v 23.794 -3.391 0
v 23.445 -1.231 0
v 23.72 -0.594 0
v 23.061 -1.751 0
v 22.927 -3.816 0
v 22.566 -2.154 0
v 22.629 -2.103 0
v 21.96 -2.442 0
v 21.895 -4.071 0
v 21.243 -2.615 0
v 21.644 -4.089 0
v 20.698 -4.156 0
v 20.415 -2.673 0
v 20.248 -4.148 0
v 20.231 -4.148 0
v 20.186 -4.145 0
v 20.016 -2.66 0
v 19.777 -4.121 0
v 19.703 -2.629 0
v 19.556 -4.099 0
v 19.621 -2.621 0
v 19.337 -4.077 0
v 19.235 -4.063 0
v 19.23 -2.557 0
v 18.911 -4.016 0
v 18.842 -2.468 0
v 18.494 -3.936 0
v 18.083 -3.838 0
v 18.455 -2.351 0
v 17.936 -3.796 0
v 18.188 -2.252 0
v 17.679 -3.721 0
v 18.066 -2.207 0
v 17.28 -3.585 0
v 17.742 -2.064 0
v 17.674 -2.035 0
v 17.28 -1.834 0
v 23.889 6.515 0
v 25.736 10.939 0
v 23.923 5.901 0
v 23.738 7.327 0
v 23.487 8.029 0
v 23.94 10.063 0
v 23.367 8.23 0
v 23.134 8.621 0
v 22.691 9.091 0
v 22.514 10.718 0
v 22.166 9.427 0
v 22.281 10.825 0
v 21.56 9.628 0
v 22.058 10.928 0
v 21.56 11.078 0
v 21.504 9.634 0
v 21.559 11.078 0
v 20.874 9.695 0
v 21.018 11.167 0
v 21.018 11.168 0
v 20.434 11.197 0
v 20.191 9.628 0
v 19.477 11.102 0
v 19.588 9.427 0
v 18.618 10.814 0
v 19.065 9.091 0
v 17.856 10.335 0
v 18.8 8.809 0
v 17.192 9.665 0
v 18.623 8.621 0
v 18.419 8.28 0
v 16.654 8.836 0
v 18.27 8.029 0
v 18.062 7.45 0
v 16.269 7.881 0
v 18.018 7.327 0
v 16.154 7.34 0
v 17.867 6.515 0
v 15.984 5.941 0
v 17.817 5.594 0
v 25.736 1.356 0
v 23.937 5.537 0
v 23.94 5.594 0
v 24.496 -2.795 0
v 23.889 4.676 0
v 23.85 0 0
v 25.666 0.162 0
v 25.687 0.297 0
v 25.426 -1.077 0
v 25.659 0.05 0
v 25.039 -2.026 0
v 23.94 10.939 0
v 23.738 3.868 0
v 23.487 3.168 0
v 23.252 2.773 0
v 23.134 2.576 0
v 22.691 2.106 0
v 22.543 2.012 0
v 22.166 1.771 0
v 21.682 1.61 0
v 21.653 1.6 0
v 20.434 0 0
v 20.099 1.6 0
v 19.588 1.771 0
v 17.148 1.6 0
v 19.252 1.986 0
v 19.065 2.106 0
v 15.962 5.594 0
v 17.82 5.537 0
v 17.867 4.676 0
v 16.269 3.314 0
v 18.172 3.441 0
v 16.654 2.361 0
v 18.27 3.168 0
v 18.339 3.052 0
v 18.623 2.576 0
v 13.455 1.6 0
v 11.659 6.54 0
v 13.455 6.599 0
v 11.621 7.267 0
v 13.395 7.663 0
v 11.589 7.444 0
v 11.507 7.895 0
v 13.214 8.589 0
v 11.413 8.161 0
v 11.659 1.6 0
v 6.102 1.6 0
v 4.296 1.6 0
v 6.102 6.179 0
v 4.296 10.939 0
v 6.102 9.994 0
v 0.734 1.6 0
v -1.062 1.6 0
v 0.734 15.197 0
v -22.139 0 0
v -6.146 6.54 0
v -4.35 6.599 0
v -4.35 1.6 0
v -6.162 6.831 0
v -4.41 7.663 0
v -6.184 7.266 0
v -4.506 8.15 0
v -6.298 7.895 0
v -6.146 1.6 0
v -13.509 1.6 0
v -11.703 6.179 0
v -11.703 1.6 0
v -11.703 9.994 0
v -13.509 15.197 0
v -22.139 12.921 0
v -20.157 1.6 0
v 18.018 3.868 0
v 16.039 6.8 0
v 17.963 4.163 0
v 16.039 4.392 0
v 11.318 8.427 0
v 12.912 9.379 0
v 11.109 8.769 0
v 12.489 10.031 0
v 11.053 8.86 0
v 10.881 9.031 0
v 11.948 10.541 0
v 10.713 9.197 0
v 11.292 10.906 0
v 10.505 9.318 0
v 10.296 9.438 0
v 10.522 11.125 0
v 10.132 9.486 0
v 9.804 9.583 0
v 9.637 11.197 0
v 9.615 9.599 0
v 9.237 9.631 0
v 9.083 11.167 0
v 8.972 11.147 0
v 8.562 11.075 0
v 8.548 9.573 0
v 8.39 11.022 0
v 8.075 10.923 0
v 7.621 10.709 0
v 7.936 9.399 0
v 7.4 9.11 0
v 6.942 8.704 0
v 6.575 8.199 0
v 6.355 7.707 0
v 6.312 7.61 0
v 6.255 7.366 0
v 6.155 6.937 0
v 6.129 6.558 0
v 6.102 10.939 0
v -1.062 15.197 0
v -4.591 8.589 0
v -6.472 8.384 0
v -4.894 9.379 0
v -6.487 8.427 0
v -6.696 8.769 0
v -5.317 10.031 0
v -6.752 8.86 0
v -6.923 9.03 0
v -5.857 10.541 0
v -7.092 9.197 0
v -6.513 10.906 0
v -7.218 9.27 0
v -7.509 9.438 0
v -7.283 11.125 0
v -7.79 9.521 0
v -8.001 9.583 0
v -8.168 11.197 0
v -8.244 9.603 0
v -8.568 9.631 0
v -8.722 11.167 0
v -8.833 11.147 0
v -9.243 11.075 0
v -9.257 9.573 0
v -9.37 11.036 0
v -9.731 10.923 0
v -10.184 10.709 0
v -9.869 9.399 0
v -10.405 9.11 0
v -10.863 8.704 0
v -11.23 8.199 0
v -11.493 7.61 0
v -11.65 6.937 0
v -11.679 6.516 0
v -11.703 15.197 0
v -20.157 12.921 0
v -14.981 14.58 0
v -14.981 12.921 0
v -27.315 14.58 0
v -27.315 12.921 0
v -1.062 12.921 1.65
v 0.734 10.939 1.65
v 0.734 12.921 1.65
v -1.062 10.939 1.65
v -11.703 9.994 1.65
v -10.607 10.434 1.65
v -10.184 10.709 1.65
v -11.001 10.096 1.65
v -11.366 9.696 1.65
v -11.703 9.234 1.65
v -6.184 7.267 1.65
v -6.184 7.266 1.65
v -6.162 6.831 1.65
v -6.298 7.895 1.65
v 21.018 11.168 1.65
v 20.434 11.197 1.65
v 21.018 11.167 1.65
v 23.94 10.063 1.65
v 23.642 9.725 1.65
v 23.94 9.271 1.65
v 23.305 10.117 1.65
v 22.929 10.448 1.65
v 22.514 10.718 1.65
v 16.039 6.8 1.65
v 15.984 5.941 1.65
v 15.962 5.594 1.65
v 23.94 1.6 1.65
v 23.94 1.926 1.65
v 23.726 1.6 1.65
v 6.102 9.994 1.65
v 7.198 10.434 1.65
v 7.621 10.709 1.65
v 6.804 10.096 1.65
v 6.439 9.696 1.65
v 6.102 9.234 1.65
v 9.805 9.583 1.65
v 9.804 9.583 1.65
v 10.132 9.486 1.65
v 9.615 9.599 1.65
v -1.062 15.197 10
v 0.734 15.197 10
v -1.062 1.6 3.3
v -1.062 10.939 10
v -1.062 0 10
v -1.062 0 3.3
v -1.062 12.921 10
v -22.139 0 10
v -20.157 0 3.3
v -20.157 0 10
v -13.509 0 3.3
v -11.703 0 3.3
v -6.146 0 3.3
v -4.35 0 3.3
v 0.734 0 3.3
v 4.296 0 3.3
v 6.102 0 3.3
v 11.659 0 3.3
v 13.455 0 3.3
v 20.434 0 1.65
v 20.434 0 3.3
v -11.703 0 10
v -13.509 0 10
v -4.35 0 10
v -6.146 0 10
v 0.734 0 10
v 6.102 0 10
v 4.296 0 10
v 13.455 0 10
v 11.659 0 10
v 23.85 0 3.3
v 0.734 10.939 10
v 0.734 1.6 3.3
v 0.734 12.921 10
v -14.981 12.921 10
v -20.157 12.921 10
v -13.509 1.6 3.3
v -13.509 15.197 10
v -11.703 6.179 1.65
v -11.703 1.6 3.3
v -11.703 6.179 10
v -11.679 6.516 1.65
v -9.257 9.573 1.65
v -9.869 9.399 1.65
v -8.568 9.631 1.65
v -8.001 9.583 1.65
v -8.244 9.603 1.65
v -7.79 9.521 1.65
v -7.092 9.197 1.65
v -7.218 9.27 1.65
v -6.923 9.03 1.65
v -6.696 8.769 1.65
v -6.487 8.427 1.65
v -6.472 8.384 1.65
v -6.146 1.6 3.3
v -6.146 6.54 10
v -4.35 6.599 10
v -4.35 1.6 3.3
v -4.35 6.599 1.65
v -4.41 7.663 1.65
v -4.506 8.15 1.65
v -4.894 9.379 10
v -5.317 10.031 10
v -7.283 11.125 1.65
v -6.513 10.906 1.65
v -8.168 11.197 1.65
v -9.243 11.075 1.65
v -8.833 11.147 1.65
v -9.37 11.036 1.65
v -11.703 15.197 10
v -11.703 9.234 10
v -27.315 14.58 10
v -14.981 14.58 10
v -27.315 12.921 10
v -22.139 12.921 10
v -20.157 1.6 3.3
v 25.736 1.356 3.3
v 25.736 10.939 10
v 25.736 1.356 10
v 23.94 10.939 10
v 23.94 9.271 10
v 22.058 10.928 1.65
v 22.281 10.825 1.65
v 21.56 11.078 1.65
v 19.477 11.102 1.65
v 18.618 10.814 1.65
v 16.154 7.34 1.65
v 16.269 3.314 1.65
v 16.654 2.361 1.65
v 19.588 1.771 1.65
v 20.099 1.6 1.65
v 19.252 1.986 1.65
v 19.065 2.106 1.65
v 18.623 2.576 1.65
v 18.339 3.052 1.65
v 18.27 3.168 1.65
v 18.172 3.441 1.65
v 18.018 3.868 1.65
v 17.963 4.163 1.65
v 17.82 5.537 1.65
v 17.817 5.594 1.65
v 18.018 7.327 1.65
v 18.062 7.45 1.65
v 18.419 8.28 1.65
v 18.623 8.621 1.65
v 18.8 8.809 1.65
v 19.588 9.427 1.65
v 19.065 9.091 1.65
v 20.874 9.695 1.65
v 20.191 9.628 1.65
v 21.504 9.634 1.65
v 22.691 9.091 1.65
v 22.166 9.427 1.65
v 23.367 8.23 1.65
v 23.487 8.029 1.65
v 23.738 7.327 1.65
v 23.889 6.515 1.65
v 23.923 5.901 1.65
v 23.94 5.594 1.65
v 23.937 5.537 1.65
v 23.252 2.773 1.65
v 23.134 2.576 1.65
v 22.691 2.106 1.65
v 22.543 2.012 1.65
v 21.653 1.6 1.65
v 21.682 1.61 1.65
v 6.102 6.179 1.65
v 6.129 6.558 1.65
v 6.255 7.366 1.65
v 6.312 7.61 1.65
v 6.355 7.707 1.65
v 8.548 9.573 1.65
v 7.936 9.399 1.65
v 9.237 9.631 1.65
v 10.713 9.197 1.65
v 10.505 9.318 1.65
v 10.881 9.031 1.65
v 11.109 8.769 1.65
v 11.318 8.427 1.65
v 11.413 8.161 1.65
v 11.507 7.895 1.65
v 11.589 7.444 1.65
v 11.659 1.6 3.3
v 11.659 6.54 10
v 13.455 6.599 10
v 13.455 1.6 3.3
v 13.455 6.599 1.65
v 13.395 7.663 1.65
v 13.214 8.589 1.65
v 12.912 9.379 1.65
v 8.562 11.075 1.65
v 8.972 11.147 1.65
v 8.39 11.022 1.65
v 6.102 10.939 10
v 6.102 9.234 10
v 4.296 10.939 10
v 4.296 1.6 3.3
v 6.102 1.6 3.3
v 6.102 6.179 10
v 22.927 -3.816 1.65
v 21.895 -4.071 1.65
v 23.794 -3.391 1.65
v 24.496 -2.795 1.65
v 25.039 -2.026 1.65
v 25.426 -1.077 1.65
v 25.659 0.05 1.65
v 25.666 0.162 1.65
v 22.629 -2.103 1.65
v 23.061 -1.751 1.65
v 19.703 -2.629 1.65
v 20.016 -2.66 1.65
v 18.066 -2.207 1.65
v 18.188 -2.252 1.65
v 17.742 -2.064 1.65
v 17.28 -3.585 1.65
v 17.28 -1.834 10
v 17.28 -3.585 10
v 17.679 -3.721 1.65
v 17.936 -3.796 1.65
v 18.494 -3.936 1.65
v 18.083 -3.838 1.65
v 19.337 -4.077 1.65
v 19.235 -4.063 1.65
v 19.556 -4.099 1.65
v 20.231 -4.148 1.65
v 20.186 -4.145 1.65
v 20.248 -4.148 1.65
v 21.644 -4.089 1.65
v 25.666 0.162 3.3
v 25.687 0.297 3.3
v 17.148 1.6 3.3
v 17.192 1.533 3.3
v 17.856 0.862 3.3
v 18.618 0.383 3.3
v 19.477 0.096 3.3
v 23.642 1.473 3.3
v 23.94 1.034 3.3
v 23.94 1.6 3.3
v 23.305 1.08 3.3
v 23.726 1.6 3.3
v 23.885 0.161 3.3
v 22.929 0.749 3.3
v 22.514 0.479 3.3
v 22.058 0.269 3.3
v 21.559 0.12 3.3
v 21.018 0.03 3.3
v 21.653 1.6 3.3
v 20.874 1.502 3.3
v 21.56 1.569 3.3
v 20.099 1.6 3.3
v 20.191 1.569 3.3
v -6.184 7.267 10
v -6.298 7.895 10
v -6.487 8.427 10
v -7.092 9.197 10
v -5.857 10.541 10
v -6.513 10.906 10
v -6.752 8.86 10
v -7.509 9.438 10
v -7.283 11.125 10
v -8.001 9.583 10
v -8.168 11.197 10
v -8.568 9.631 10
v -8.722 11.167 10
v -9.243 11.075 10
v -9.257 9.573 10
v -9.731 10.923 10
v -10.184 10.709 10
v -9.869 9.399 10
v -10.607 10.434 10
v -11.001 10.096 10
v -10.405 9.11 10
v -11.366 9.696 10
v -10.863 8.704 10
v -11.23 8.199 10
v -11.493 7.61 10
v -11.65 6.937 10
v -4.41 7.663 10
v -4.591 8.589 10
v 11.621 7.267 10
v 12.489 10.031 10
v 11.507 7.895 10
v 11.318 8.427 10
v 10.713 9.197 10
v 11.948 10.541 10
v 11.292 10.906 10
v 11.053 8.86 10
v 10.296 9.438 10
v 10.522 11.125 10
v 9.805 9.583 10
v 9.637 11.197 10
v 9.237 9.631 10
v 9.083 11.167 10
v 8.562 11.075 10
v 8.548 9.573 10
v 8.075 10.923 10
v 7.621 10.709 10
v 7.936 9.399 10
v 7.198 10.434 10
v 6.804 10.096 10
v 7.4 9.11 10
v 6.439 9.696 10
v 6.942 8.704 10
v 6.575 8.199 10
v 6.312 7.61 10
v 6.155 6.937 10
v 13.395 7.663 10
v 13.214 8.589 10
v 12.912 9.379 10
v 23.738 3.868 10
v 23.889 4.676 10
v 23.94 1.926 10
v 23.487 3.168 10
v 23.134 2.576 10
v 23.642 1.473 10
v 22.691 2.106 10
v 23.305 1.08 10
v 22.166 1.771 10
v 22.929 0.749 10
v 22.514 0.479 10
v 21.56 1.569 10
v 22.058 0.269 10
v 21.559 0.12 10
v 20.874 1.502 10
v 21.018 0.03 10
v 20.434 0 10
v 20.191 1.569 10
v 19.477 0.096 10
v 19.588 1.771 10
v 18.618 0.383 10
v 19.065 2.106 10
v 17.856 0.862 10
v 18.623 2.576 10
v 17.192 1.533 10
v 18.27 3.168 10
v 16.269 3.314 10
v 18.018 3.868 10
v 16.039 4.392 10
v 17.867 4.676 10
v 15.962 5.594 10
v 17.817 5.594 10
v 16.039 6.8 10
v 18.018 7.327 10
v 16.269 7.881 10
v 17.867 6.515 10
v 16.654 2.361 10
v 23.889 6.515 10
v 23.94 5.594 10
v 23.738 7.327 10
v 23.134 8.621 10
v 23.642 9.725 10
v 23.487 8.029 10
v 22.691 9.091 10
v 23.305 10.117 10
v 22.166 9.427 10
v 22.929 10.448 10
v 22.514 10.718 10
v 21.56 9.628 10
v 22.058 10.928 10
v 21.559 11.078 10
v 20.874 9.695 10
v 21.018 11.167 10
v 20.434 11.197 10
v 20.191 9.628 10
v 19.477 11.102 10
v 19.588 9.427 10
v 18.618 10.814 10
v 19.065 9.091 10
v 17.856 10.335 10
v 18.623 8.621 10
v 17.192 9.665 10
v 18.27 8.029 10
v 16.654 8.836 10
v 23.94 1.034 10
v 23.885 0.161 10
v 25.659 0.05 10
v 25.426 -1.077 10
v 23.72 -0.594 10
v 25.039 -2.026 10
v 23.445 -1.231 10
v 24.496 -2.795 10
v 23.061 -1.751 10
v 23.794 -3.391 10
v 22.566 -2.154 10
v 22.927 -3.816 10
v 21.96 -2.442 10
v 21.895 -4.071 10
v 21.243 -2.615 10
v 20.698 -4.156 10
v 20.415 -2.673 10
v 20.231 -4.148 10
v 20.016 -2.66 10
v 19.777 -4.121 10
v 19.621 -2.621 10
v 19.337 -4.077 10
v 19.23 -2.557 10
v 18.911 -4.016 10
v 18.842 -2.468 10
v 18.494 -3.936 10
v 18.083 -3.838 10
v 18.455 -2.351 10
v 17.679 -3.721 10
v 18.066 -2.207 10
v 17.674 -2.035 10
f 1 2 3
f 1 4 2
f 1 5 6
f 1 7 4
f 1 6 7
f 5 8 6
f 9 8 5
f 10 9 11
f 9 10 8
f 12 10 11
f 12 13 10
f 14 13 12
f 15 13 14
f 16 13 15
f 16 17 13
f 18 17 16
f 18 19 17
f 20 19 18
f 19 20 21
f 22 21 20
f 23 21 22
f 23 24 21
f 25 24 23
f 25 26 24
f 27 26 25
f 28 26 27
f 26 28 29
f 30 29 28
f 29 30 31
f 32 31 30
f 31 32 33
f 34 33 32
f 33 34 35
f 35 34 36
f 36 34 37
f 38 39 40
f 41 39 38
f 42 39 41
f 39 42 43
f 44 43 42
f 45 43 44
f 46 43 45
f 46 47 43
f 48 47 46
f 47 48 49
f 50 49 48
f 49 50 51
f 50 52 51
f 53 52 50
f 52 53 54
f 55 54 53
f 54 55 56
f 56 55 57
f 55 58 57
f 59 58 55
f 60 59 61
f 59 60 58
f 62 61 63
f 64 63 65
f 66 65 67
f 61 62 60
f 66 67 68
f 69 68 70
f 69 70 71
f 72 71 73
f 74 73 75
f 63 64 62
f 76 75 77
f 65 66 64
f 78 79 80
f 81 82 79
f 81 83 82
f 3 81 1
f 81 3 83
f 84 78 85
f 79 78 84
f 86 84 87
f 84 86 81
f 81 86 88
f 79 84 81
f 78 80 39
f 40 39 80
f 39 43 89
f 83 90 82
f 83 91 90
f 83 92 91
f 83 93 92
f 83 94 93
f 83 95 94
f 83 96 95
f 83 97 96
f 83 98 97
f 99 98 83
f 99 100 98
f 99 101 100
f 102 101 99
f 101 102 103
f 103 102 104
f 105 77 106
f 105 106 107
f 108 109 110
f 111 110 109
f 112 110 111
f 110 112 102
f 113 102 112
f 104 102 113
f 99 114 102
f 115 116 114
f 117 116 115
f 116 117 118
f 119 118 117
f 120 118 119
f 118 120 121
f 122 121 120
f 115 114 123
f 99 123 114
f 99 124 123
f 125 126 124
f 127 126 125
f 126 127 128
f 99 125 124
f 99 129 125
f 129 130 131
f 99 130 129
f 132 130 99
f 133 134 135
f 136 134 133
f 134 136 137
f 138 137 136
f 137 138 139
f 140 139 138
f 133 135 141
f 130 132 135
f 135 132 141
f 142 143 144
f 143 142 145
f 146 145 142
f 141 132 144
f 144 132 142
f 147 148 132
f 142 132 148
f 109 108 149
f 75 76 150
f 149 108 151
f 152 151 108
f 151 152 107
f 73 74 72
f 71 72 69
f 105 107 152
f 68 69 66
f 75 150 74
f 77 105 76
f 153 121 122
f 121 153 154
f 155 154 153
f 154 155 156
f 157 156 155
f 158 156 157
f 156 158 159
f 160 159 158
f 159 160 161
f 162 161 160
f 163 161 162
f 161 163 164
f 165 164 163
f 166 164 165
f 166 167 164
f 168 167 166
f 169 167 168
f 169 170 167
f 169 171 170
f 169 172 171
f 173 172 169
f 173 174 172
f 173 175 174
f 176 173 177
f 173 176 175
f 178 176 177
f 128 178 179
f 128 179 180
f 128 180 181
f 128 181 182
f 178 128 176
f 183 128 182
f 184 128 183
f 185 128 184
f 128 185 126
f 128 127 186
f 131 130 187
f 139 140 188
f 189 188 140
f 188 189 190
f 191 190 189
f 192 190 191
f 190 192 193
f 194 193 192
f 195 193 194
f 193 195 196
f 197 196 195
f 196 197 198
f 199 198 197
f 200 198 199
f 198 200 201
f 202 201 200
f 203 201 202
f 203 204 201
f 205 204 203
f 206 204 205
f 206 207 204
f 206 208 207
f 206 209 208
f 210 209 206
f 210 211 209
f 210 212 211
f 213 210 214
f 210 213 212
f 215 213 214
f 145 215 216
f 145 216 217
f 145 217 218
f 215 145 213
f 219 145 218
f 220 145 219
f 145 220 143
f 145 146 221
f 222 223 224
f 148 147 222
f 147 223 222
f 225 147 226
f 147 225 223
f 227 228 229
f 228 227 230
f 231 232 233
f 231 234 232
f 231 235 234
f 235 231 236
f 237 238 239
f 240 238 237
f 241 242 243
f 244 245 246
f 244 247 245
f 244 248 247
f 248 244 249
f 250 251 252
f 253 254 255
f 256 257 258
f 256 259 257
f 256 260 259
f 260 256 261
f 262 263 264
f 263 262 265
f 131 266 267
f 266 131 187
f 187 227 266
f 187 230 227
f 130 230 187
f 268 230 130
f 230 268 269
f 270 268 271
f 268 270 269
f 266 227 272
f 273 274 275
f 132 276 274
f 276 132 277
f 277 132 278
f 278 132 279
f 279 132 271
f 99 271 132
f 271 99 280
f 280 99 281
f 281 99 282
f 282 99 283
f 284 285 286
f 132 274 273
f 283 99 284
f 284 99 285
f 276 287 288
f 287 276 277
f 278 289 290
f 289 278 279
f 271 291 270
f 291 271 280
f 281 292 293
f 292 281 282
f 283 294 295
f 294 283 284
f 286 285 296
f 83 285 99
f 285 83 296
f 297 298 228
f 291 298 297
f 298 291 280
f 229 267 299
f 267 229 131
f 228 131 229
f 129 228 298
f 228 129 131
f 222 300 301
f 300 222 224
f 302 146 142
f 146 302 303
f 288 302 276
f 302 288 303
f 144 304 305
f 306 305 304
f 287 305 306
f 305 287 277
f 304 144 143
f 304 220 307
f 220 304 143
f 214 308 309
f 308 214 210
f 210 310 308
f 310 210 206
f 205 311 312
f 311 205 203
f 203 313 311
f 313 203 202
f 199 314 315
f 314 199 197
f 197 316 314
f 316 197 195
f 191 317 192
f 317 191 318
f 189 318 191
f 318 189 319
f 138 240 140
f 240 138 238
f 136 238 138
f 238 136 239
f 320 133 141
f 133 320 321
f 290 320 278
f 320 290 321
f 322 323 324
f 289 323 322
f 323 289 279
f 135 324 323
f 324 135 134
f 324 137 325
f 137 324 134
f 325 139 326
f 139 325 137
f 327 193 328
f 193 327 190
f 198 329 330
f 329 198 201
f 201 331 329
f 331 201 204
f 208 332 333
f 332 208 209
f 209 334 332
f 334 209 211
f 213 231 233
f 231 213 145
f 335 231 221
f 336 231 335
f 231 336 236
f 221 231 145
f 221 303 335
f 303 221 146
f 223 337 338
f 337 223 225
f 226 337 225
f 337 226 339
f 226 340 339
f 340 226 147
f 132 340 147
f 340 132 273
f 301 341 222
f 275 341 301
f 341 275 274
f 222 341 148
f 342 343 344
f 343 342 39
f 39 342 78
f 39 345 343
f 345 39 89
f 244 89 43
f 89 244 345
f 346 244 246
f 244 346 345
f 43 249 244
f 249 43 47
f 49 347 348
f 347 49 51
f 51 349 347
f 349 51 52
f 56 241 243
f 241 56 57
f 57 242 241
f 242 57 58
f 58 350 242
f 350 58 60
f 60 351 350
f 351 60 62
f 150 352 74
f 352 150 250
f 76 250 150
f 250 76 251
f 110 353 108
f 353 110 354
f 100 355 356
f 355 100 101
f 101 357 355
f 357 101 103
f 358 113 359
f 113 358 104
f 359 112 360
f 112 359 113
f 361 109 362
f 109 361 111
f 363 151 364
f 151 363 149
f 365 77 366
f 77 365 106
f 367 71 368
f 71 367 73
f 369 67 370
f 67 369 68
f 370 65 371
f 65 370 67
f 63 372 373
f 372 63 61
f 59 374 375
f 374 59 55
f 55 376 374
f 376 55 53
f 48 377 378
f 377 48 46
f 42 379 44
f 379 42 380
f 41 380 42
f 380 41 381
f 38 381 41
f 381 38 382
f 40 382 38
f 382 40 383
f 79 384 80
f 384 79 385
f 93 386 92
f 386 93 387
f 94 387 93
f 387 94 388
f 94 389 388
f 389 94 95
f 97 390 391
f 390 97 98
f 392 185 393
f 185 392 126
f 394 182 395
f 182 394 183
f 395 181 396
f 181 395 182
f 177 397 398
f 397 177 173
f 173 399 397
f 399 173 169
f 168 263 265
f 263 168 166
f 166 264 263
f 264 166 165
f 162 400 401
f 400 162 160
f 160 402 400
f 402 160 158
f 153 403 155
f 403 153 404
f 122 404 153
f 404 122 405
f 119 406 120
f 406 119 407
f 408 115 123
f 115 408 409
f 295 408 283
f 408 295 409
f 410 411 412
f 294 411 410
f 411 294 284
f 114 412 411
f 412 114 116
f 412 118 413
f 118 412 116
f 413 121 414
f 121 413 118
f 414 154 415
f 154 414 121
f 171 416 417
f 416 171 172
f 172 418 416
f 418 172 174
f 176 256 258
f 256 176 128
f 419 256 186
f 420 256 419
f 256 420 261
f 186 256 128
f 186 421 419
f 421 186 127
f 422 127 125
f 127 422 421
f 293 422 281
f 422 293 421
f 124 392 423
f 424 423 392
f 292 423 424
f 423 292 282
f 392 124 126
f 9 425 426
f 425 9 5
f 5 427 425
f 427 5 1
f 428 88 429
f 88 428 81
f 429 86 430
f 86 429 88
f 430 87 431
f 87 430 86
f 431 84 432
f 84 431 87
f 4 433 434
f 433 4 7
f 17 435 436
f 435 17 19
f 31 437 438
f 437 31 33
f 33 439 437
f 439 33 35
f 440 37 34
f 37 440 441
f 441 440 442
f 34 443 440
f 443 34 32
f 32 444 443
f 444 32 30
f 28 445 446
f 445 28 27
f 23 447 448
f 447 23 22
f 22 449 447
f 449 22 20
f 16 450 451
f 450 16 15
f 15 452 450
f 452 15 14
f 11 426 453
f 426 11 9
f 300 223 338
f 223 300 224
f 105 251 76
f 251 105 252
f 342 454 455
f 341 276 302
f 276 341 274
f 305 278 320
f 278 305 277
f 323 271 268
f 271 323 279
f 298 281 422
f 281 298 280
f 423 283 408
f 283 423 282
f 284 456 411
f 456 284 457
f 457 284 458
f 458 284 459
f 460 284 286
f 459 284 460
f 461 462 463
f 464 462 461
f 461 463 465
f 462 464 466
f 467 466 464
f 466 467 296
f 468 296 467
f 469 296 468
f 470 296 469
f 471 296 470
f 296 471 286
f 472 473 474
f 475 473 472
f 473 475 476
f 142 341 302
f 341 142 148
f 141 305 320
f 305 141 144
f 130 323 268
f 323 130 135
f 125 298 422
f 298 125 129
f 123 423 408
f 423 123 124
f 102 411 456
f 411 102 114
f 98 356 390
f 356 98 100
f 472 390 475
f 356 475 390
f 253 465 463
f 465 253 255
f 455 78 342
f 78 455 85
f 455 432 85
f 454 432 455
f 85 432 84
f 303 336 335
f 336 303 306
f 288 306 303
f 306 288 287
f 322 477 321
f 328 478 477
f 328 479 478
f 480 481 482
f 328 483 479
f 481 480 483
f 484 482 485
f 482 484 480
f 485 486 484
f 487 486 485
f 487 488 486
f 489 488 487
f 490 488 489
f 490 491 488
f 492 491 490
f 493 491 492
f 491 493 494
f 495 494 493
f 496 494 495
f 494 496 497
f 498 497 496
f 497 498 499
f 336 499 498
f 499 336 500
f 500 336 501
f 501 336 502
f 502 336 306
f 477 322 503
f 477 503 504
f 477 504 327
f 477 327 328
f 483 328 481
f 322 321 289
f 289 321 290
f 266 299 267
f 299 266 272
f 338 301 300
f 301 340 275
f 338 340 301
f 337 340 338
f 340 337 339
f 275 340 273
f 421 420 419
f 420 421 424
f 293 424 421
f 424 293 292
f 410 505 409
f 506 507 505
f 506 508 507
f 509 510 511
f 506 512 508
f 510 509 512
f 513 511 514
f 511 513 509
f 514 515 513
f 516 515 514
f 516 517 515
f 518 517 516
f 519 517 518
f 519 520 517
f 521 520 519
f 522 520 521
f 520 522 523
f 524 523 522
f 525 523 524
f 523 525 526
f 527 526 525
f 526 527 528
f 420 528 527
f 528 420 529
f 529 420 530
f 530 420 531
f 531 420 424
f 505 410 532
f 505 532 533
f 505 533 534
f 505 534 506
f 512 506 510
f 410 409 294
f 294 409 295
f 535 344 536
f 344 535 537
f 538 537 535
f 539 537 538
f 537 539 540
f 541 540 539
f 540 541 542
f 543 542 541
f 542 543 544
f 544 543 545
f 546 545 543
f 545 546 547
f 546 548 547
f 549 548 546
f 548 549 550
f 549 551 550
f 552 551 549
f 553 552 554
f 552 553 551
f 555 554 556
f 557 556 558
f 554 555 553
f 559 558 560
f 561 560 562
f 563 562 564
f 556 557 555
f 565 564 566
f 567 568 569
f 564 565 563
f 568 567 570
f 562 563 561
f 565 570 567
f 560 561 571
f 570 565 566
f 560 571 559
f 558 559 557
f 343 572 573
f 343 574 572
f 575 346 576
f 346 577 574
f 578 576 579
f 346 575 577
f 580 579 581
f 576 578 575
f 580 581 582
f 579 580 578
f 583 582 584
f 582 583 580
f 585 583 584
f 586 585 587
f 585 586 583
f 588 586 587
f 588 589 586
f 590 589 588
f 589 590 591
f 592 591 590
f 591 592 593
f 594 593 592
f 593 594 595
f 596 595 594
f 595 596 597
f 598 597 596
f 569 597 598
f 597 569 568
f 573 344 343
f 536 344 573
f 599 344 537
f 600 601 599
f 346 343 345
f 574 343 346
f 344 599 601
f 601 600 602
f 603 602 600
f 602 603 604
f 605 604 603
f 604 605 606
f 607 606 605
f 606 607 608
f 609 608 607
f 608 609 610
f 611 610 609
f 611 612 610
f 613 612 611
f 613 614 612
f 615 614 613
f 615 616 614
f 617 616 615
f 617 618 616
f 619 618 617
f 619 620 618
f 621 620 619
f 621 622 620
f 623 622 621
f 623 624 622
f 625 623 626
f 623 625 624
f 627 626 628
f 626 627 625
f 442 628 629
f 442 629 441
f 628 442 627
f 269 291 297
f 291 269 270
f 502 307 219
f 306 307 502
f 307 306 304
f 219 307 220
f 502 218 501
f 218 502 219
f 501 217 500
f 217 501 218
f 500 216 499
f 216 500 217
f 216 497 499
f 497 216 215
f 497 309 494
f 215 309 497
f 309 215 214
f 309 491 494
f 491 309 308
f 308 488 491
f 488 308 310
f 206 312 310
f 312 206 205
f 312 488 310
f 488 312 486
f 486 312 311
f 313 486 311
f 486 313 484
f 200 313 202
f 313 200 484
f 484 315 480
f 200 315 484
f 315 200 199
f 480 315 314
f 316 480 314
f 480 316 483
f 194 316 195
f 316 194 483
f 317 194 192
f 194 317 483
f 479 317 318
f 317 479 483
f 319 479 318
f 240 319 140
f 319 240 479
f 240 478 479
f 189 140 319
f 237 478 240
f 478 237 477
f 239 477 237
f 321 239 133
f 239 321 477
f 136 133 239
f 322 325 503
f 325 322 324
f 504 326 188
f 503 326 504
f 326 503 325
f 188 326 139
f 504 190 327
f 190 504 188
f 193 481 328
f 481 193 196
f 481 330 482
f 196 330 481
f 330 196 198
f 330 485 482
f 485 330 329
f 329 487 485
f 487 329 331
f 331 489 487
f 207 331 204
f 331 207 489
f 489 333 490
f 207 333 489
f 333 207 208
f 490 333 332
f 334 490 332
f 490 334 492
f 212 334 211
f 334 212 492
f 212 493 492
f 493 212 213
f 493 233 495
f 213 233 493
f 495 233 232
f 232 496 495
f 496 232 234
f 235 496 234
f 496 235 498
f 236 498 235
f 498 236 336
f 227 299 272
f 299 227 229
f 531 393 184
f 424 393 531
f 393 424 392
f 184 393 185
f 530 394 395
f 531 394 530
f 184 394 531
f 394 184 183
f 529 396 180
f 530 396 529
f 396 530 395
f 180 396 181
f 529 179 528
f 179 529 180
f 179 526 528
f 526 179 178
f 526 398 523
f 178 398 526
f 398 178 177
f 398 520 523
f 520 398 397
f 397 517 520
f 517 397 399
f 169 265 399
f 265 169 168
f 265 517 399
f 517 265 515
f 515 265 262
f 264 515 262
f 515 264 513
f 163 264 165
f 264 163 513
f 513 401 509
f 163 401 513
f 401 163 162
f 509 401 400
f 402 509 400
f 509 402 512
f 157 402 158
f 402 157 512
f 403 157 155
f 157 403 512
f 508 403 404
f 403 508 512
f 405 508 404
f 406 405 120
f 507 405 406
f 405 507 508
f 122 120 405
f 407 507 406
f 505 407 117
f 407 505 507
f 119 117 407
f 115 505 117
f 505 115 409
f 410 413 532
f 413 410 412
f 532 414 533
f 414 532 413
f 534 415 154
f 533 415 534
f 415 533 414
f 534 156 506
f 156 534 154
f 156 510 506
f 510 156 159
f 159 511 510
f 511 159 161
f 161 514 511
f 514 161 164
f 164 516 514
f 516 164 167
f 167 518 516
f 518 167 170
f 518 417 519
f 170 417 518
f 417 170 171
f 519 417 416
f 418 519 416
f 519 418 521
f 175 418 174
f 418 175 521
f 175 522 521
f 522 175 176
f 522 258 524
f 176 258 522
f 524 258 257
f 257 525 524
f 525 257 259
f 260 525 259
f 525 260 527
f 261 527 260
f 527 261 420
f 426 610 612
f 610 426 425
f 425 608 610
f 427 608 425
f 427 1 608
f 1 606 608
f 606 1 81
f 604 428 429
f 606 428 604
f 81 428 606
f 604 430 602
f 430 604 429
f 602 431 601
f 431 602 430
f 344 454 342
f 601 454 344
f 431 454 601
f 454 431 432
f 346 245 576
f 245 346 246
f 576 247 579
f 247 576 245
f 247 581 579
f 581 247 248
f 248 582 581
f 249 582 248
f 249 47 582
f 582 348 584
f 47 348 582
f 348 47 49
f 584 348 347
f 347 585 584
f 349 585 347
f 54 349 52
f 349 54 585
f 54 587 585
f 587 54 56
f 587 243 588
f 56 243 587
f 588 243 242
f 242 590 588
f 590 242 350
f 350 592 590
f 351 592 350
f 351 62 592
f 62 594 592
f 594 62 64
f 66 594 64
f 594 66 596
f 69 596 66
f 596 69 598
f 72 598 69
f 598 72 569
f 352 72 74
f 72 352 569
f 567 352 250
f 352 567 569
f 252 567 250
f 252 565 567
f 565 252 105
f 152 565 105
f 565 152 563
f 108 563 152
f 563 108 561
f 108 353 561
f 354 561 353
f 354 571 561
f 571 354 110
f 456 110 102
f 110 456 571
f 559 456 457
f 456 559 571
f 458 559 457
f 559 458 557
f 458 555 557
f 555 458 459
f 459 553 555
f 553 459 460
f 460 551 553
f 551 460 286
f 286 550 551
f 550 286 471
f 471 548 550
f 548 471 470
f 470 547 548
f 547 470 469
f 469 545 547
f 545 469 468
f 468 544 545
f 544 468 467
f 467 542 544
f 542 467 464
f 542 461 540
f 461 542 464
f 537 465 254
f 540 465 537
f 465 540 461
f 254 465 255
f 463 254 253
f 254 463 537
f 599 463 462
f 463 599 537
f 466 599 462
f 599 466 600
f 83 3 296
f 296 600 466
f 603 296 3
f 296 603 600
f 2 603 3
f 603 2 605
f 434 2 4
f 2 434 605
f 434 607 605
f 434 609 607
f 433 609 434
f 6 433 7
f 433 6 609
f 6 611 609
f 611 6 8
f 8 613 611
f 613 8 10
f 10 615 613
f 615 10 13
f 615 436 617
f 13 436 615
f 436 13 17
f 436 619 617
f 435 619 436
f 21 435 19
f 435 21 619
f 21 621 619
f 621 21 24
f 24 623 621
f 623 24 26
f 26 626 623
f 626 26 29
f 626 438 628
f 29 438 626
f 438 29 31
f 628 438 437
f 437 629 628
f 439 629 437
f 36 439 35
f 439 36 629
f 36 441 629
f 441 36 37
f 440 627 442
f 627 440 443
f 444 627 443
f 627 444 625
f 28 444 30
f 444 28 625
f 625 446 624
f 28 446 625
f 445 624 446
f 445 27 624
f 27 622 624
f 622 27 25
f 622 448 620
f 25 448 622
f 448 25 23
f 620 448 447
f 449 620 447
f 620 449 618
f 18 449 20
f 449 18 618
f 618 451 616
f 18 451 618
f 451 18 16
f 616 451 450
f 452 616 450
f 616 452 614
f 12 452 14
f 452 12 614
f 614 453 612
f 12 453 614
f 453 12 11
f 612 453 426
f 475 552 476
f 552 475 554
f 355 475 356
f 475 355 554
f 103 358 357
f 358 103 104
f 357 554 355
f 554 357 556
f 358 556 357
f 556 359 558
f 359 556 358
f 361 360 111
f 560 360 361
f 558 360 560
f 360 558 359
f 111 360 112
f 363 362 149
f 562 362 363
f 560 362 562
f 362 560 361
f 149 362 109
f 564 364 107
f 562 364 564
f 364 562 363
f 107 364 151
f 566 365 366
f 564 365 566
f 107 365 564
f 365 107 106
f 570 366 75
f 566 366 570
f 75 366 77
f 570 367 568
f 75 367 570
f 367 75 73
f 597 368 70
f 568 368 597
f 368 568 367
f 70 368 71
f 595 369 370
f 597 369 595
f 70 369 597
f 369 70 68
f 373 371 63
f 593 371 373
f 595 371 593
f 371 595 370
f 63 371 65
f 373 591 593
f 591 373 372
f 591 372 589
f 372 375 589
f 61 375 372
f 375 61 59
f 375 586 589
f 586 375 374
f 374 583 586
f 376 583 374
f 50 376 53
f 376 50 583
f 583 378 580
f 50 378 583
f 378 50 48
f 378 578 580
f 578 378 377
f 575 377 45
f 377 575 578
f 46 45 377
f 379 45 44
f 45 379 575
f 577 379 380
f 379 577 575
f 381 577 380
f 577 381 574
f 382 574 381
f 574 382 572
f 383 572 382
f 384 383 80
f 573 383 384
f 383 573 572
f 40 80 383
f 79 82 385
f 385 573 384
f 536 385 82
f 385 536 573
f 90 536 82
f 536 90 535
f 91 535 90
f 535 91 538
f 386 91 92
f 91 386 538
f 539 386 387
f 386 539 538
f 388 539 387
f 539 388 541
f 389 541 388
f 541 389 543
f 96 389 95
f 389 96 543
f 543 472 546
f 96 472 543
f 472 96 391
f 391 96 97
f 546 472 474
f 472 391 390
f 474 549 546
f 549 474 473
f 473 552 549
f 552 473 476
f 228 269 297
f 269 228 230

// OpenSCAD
//Set the text to render
textstring="Thing";

//Font name, e.g. "Libration Sans", "Aldo", depends on what is available on the platform. In the customizer,choose from about 700 Google Fonts. For an overview please refer: http://www.google.com/fonts
fontname="Orbitron"; //[ABeeZee,Abel,Abril Fatface,Aclonica,Acme,Actor,Adamina,Advent Pro,Aguafina Script,Akronim,Aladin,Aldrich,Alef,Alegreya,Alegreya Sans,Alegreya Sans SC,Alegreya SC,Alex Brush,Alfa Slab One,Alice,Alike,Alike Angular,Allan,Allerta,Allerta Stencil,Allura,Almendra,Almendra Display,Almendra SC,Amarante,Amaranth,Amatic SC,Amethysta,Amiri,Anaheim,Andada,Andika,Angkor,Annie Use Your Telescope,Anonymous Pro,Antic,Antic Didone,Antic Slab,Anton,Arapey,Arbutus,Arbutus Slab,Architects Daughter,Archivo Black,Archivo Narrow,Arimo,Arizonia,Armata,Artifika,Arvo,Asap,Asset,Astloch,Asul,Atomic Age,Aubrey,Audiowide,Autour One,Average,Average Sans,Averia Gruesa Libre,Averia Libre,Averia Sans Libre,Averia Serif Libre,Bad Script,Balthazar,Bangers,Basic,Battambang,Baumans,Bayon,Belgrano,Belleza,BenchNine,Bentham,Berkshire Swash,Bevan,Bigelow Rules,Bigshot One,Bilbo,Bilbo Swash Caps,Bitter,Black Ops One,Bokor,Bonbon,Boogaloo,Bowlby One,Bowlby One SC,Brawler,Bree Serif,Bubblegum Sans,Bubbler One,Buda,Buenard,Butcherman,Butterfly Kids,Cabin,Cabin Condensed,Cabin Sketch,Caesar Dressing,Cagliostro,Calligraffitti,Cambay,Cambo,Candal,Cantarell,Cantata One,Cantora One,Capriola,Cardo,Carme,Carrois Gothic,Carrois Gothic SC,Carter One,Caudex,Cedarville Cursive,Ceviche One,Changa One,Chango,Chau Philomene One,Chela One,Chelsea Market,Chenla,Cherry Cream Soda,Cherry Swash,Chewy,Chicle,Chivo,Cinzel,Cinzel Decorative,Clicker Script,Coda,Coda Caption,Codystar,Combo,Comfortaa,Coming Soon,Concert One,Condiment,Content,Contrail One,Convergence,Cookie,Copse,Corben,Courgette,Cousine,Coustard,Covered By Your Grace,Crafty Girls,Creepster,Crete Round,Crimson Text,Croissant One,Crushed,Cuprum,Cutive,Cutive Mono,Damion,Dancing Script,Dangrek,Dawning of a New Day,Days One,Dekko,Delius,Delius Swash Caps,Delius Unicase,Della Respira,Denk One,Devonshire,Dhurjati,Didact Gothic,Diplomata,Diplomata SC,Domine,Donegal One,Doppio One,Dorsa,Dosis,Dr Sugiyama,Droid Sans,Droid Sans Mono,Droid Serif,Duru Sans,Dynalight,Eagle Lake,Eater,EB Garamond,Economica,Ek Mukta,Electrolize,Elsie,Elsie Swash Caps,Emblema One,Emilys Candy,Engagement,Englebert,Enriqueta,Erica One,Esteban,Euphoria Script,Ewert,Exo,Exo 2,Expletus Sans,Fanwood Text,Fascinate,Fascinate Inline,Faster One,Fasthand,Fauna One,Federant,Federo,Felipa,Fenix,Finger Paint,Fira Mono,Fira Sans,Fjalla One,Fjord One,Flamenco,Flavors,Fondamento,Fontdiner Swanky,Forum,Francois One,Freckle Face,Fredericka the Great,Fredoka One,Freehand,Fresca,Frijole,Fruktur,Fugaz One,Gabriela,Gafata,Galdeano,Galindo,Gentium Basic,Gentium Book Basic,Geo,Geostar,Geostar Fill,Germania One,GFS Didot,GFS Neohellenic,Gidugu,Gilda Display,Give You Glory,Glass Antiqua,Glegoo,Gloria Hallelujah,Goblin One,Gochi Hand,Gorditas,Goudy Bookletter 1911,Graduate,Grand Hotel,Gravitas One,Great Vibes,Griffy,Gruppo,Gudea,Gurajada,Habibi,Halant,Hammersmith One,Hanalei,Hanalei Fill,Handlee,Hanuman,Happy Monkey,Headland One,Henny Penny,Herr Von Muellerhoff,Hind,Holtwood One SC,Homemade Apple,Homenaje,Iceberg,Iceland,IM Fell Double Pica,IM Fell Double Pica SC,IM Fell DW Pica,IM Fell DW Pica SC,IM Fell English,IM Fell English SC,IM Fell French Canon,IM Fell French Canon SC,IM Fell Great Primer,IM Fell Great Primer SC,Imprima,Inconsolata,Inder,Indie Flower,Inika,Irish Grover,Istok Web,Italiana,Italianno,Jacques Francois,Jacques Francois Shadow,Jim Nightshade,Jockey One,Jolly Lodger,Josefin Sans,Josefin Slab,Joti One,Judson,Julee,Julius Sans One,Junge,Jura,Just Another Hand,Just Me Again Down Here,Kalam,Kameron,Kantumruy,Karla,Karma,Kaushan Script,Kavoon,Kdam Thmor,Keania One,Kelly Slab,Kenia,Khand,Khmer,Khula,Kite One,Knewave,Kotta One,Koulen,Kranky,Kreon,Kristi,Krona One,La Belle Aurore,Laila,Lakki Reddy,Lancelot,Lateef,Lato,League Script,Leckerli One,Ledger,Lekton,Lemon,Liberation Sans,Libre Baskerville,Life Savers,Lilita One,Lily Script One,Limelight,Linden Hill,Lobster,Lobster Two,Londrina Outline,Londrina Shadow,Londrina Sketch,Londrina Solid,Lora,Love Ya Like A Sister,Loved by the King,Lovers Quarrel,Luckiest Guy,Lusitana,Lustria,Macondo,Macondo Swash Caps,Magra,Maiden Orange,Mako,Mallanna,Mandali,Marcellus,Marcellus SC,Marck Script,Margarine,Marko One,Marmelad,Martel Sans,Marvel,Mate,Mate SC,Maven Pro,McLaren,Meddon,MedievalSharp,Medula One,Megrim,Meie Script,Merienda,Merienda One,Merriweather,Merriweather Sans,Metal,Metal Mania,Metamorphous,Metrophobic,Michroma,Milonga,Miltonian,Miltonian Tattoo,Miniver,Miss Fajardose,Modak,Modern Antiqua,Molengo,Molle,Monda,Monofett,Monoton,Monsieur La Doulaise,Montaga,Montez,Montserrat,Montserrat Alternates,Montserrat Subrayada,Moul,Moulpali,Mountains of Christmas,Mouse Memoirs,Mr Bedfort,Mr Dafoe,Mr De Haviland,Mrs Saint Delafield,Mrs Sheppards,Muli,Mystery Quest,Neucha,Neuton,New Rocker,News Cycle,Niconne,Nixie One,Nobile,Nokora,Norican,Nosifer,Nothing You Could Do,Noticia Text,Noto Sans,Noto Serif,Nova Cut,Nova Flat,Nova Mono,Nova Oval,Nova Round,Nova Script,Nova Slim,Nova Square,NTR,Numans,Nunito,Odor Mean Chey,Offside,Old Standard TT,Oldenburg,Oleo Script,Oleo Script Swash Caps,Open Sans,Open Sans Condensed,Oranienbaum,Orbitron,Oregano,Orienta,Original Surfer,Oswald,Over the Rainbow,Overlock,Overlock SC,Ovo,Oxygen,Oxygen Mono,Pacifico,Paprika,Parisienne,Passero One,Passion One,Pathway Gothic One,Patrick Hand,Patrick Hand SC,Patua One,Paytone One,Peddana,Peralta,Permanent Marker,Petit Formal Script,Petrona,Philosopher,Piedra,Pinyon Script,Pirata One,Plaster,Play,Playball,Playfair Display,Playfair Display SC,Podkova,Poiret One,Poller One,Poly,Pompiere,Pontano Sans,Port Lligat Sans,Port Lligat Slab,Prata,Preahvihear,Press Start 2P,Princess Sofia,Prociono,Prosto One,PT Mono,PT Sans,PT Sans Caption,PT Sans Narrow,PT Serif,PT Serif Caption,Puritan,Purple Purse,Quando,Quantico,Quattrocento,Quattrocento Sans,Questrial,Quicksand,Quintessential,Qwigley,Racing Sans One,Radley,Rajdhani,Raleway,Raleway Dots,Ramabhadra,Ramaraja,Rambla,Rammetto One,Ranchers,Rancho,Ranga,Rationale,Ravi Prakash,Redressed,Reenie Beanie,Revalia,Ribeye,Ribeye Marrow,Righteous,Risque,Roboto,Roboto Condensed,Roboto Slab,Rochester,Rock Salt,Rokkitt,Romanesco,Ropa Sans,Rosario,Rosarivo,Rouge Script,Rozha One,Rubik Mono One,Rubik One,Ruda,Rufina,Ruge Boogie,Ruluko,Rum Raisin,Ruslan Display,Russo One,Ruthie,Rye,Sacramento,Sail,Salsa,Sanchez,Sancreek,Sansita One,Sarina,Sarpanch,Satisfy,Scada,Scheherazade,Schoolbell,Seaweed Script,Sevillana,Seymour One,Shadows Into Light,Shadows Into Light Two,Shanti,Share,Share Tech,Share Tech Mono,Shojumaru,Short Stack,Siemreap,Sigmar One,Signika,Signika Negative,Simonetta,Sintony,Sirin Stencil,Six Caps,Skranji,Slabo 13px,Slabo 27px,Slackey,Smokum,Smythe,Sniglet,Snippet,Snowburst One,Sofadi One,Sofia,Sonsie One,Sorts Mill Goudy,Source Code Pro,Source Sans Pro,Source Serif Pro,Special Elite,Spicy Rice,Spinnaker,Spirax,Squada One,Sree Krushnadevaraya,Stalemate,Stalinist One,Stardos Stencil,Stint Ultra Condensed,Stint Ultra Expanded,Stoke,Strait,Sue Ellen Francisco,Sunshiney,Supermercado One,Suranna,Suravaram,Suwannaphum,Swanky and Moo Moo,Syncopate,Tangerine,Taprom,Tauri,Teko,Telex,Tenali Ramakrishna,Tenor Sans,Text Me One,The Girl Next Door,Tienne,Timmana,Tinos,Titan One,Titillium Web,Trade Winds,Trocchi,Trochut,Trykker,Tulpen One,Ubuntu,Ubuntu Condensed,Ubuntu Mono,Ultra,Uncial Antiqua,Underdog,Unica One,UnifrakturCook,UnifrakturMaguntia,Unkempt,Unlock,Unna,Vampiro One,Varela,Varela Round,Vast Shadow,Vesper Libre,Vibur,Vidaloka,Viga,Voces,Volkhov,Vollkorn,Voltaire,VT323,Waiting for the Sunrise,Wallpoet,Walter Turncoat,Warnes,Wellfleet,Wendy One,Wire One,Yanone Kaffeesatz,Yellowtail,Yeseva One,Yesteryear,Zeyada]

//Use a rounded base to connect all letters or use a connecting bar?
RoundedBase=0; //[0, 1]

//Shift the font up/down to connect i and j dots? Select "no" if you have no i or j in your text.
do_shift_font="automatic"; //[automatic,yes,no]

//Set font size in mm
textsize=16; 

//Text height (extrusion) in mm
textheight=10;

//Connecting bar height (extrusion in print direction) in percent of the text height
baseheight_percent=.33;
baseheight=textheight*baseheight_percent;

//Connecting bar thickness in percent of the font size
basethickness_percent=0.1;
basethickness=textsize*basethickness_percent;

//Amount to shift the font up/down to connect i and j dots for printing. 
font_catch_diacritical_sign=2.3; 

//Only for a rounded base: Base increase size to make letters meet, in percent of the textsize
base_radius_add_percent=.1;
base_radius_add=textsize*base_radius_add_percent;

/* [Hidden] */
//-------------------------------------------------------------------------------

iorj = [ for (i = [0 : len(textstring) - 1]) if (textstring[i]=="i" || textstring[i]=="j") 1 ];

dummy_cutoutlen=len(textstring)*textsize;

/*
Name and Text
Version F, March 2015
Written by MC Geisler (mcgenki at gmail dot com)

This is a proper configurable name plate, consisting of separate extruded letters. Use the variables to get the text you need.

Each letter and also the dots of 'i' and 'j' are connected together, so after printing it will not fall apart.

Use it to create mini name tags (the text in the picture is 9mm high) or big text sculptures!

Have fun!

License: Attribution 4.0 International (CC BY 4.0)

You are free to:
    Share - copy and redistribute the material in any medium or format
    Adapt - remix, transform, and build upon the material
    for any purpose, even commercially.
*/


    
module writetext(textstr, sizeit)
{
    text(textstr,size=sizeit*.9,font=fontname,halign="center",valign="baseline");
}

module RiseText(textstr, textsize,textheight) 
{

    linear_extrude(height=textheight,convexity = 10)
        writetext(textstr, textsize);

    //create base
    if(RoundedBase==0)
    {
        //base line to connect
        linear_extrude(height=baseheight, twist=0, slices=1, $fn=32) 
            hull()
                intersection()
                {
                    writetext(textstr, textsize);
                    
                    //translate([0,-textsize/2+basethickness/2+base_offset,0])
                    translate([0,basethickness/2,0])
                       square([dummy_cutoutlen,basethickness],center=true);
                }
              
        if ( (do_shift_font=="automatic" && iorj[0]==1) || do_shift_font=="yes")  
        {
            //connect i and j dots
            assign(delta=textsize/30*font_catch_diacritical_sign)
               intersection()
               {
                   //connect the dots but maybe too much in other locations
                   linear_extrude(height=baseheight/2,convexity = 10)
                        offset(delta=-delta)   
                            offset(delta=delta)
                                writetext(textstr, textsize);
               
                   //connect only vertical parts by shifting
                   linear_extrude(height=baseheight/2,convexity = 10)
                       for ( i = [-1 : 1] )
                           translate([0,i*delta,0])
                                writetext(textstr, textsize);
               }
       }

    }
    else        
    {
                linear_extrude(height=baseheight, twist=0, slices=1, $fn=32) 
                    offset(r = base_radius_add) 
                    {
                        writetext(textstr, textsize);
                    }
    }

}

RiseText(textstring,textsize,textheight);
